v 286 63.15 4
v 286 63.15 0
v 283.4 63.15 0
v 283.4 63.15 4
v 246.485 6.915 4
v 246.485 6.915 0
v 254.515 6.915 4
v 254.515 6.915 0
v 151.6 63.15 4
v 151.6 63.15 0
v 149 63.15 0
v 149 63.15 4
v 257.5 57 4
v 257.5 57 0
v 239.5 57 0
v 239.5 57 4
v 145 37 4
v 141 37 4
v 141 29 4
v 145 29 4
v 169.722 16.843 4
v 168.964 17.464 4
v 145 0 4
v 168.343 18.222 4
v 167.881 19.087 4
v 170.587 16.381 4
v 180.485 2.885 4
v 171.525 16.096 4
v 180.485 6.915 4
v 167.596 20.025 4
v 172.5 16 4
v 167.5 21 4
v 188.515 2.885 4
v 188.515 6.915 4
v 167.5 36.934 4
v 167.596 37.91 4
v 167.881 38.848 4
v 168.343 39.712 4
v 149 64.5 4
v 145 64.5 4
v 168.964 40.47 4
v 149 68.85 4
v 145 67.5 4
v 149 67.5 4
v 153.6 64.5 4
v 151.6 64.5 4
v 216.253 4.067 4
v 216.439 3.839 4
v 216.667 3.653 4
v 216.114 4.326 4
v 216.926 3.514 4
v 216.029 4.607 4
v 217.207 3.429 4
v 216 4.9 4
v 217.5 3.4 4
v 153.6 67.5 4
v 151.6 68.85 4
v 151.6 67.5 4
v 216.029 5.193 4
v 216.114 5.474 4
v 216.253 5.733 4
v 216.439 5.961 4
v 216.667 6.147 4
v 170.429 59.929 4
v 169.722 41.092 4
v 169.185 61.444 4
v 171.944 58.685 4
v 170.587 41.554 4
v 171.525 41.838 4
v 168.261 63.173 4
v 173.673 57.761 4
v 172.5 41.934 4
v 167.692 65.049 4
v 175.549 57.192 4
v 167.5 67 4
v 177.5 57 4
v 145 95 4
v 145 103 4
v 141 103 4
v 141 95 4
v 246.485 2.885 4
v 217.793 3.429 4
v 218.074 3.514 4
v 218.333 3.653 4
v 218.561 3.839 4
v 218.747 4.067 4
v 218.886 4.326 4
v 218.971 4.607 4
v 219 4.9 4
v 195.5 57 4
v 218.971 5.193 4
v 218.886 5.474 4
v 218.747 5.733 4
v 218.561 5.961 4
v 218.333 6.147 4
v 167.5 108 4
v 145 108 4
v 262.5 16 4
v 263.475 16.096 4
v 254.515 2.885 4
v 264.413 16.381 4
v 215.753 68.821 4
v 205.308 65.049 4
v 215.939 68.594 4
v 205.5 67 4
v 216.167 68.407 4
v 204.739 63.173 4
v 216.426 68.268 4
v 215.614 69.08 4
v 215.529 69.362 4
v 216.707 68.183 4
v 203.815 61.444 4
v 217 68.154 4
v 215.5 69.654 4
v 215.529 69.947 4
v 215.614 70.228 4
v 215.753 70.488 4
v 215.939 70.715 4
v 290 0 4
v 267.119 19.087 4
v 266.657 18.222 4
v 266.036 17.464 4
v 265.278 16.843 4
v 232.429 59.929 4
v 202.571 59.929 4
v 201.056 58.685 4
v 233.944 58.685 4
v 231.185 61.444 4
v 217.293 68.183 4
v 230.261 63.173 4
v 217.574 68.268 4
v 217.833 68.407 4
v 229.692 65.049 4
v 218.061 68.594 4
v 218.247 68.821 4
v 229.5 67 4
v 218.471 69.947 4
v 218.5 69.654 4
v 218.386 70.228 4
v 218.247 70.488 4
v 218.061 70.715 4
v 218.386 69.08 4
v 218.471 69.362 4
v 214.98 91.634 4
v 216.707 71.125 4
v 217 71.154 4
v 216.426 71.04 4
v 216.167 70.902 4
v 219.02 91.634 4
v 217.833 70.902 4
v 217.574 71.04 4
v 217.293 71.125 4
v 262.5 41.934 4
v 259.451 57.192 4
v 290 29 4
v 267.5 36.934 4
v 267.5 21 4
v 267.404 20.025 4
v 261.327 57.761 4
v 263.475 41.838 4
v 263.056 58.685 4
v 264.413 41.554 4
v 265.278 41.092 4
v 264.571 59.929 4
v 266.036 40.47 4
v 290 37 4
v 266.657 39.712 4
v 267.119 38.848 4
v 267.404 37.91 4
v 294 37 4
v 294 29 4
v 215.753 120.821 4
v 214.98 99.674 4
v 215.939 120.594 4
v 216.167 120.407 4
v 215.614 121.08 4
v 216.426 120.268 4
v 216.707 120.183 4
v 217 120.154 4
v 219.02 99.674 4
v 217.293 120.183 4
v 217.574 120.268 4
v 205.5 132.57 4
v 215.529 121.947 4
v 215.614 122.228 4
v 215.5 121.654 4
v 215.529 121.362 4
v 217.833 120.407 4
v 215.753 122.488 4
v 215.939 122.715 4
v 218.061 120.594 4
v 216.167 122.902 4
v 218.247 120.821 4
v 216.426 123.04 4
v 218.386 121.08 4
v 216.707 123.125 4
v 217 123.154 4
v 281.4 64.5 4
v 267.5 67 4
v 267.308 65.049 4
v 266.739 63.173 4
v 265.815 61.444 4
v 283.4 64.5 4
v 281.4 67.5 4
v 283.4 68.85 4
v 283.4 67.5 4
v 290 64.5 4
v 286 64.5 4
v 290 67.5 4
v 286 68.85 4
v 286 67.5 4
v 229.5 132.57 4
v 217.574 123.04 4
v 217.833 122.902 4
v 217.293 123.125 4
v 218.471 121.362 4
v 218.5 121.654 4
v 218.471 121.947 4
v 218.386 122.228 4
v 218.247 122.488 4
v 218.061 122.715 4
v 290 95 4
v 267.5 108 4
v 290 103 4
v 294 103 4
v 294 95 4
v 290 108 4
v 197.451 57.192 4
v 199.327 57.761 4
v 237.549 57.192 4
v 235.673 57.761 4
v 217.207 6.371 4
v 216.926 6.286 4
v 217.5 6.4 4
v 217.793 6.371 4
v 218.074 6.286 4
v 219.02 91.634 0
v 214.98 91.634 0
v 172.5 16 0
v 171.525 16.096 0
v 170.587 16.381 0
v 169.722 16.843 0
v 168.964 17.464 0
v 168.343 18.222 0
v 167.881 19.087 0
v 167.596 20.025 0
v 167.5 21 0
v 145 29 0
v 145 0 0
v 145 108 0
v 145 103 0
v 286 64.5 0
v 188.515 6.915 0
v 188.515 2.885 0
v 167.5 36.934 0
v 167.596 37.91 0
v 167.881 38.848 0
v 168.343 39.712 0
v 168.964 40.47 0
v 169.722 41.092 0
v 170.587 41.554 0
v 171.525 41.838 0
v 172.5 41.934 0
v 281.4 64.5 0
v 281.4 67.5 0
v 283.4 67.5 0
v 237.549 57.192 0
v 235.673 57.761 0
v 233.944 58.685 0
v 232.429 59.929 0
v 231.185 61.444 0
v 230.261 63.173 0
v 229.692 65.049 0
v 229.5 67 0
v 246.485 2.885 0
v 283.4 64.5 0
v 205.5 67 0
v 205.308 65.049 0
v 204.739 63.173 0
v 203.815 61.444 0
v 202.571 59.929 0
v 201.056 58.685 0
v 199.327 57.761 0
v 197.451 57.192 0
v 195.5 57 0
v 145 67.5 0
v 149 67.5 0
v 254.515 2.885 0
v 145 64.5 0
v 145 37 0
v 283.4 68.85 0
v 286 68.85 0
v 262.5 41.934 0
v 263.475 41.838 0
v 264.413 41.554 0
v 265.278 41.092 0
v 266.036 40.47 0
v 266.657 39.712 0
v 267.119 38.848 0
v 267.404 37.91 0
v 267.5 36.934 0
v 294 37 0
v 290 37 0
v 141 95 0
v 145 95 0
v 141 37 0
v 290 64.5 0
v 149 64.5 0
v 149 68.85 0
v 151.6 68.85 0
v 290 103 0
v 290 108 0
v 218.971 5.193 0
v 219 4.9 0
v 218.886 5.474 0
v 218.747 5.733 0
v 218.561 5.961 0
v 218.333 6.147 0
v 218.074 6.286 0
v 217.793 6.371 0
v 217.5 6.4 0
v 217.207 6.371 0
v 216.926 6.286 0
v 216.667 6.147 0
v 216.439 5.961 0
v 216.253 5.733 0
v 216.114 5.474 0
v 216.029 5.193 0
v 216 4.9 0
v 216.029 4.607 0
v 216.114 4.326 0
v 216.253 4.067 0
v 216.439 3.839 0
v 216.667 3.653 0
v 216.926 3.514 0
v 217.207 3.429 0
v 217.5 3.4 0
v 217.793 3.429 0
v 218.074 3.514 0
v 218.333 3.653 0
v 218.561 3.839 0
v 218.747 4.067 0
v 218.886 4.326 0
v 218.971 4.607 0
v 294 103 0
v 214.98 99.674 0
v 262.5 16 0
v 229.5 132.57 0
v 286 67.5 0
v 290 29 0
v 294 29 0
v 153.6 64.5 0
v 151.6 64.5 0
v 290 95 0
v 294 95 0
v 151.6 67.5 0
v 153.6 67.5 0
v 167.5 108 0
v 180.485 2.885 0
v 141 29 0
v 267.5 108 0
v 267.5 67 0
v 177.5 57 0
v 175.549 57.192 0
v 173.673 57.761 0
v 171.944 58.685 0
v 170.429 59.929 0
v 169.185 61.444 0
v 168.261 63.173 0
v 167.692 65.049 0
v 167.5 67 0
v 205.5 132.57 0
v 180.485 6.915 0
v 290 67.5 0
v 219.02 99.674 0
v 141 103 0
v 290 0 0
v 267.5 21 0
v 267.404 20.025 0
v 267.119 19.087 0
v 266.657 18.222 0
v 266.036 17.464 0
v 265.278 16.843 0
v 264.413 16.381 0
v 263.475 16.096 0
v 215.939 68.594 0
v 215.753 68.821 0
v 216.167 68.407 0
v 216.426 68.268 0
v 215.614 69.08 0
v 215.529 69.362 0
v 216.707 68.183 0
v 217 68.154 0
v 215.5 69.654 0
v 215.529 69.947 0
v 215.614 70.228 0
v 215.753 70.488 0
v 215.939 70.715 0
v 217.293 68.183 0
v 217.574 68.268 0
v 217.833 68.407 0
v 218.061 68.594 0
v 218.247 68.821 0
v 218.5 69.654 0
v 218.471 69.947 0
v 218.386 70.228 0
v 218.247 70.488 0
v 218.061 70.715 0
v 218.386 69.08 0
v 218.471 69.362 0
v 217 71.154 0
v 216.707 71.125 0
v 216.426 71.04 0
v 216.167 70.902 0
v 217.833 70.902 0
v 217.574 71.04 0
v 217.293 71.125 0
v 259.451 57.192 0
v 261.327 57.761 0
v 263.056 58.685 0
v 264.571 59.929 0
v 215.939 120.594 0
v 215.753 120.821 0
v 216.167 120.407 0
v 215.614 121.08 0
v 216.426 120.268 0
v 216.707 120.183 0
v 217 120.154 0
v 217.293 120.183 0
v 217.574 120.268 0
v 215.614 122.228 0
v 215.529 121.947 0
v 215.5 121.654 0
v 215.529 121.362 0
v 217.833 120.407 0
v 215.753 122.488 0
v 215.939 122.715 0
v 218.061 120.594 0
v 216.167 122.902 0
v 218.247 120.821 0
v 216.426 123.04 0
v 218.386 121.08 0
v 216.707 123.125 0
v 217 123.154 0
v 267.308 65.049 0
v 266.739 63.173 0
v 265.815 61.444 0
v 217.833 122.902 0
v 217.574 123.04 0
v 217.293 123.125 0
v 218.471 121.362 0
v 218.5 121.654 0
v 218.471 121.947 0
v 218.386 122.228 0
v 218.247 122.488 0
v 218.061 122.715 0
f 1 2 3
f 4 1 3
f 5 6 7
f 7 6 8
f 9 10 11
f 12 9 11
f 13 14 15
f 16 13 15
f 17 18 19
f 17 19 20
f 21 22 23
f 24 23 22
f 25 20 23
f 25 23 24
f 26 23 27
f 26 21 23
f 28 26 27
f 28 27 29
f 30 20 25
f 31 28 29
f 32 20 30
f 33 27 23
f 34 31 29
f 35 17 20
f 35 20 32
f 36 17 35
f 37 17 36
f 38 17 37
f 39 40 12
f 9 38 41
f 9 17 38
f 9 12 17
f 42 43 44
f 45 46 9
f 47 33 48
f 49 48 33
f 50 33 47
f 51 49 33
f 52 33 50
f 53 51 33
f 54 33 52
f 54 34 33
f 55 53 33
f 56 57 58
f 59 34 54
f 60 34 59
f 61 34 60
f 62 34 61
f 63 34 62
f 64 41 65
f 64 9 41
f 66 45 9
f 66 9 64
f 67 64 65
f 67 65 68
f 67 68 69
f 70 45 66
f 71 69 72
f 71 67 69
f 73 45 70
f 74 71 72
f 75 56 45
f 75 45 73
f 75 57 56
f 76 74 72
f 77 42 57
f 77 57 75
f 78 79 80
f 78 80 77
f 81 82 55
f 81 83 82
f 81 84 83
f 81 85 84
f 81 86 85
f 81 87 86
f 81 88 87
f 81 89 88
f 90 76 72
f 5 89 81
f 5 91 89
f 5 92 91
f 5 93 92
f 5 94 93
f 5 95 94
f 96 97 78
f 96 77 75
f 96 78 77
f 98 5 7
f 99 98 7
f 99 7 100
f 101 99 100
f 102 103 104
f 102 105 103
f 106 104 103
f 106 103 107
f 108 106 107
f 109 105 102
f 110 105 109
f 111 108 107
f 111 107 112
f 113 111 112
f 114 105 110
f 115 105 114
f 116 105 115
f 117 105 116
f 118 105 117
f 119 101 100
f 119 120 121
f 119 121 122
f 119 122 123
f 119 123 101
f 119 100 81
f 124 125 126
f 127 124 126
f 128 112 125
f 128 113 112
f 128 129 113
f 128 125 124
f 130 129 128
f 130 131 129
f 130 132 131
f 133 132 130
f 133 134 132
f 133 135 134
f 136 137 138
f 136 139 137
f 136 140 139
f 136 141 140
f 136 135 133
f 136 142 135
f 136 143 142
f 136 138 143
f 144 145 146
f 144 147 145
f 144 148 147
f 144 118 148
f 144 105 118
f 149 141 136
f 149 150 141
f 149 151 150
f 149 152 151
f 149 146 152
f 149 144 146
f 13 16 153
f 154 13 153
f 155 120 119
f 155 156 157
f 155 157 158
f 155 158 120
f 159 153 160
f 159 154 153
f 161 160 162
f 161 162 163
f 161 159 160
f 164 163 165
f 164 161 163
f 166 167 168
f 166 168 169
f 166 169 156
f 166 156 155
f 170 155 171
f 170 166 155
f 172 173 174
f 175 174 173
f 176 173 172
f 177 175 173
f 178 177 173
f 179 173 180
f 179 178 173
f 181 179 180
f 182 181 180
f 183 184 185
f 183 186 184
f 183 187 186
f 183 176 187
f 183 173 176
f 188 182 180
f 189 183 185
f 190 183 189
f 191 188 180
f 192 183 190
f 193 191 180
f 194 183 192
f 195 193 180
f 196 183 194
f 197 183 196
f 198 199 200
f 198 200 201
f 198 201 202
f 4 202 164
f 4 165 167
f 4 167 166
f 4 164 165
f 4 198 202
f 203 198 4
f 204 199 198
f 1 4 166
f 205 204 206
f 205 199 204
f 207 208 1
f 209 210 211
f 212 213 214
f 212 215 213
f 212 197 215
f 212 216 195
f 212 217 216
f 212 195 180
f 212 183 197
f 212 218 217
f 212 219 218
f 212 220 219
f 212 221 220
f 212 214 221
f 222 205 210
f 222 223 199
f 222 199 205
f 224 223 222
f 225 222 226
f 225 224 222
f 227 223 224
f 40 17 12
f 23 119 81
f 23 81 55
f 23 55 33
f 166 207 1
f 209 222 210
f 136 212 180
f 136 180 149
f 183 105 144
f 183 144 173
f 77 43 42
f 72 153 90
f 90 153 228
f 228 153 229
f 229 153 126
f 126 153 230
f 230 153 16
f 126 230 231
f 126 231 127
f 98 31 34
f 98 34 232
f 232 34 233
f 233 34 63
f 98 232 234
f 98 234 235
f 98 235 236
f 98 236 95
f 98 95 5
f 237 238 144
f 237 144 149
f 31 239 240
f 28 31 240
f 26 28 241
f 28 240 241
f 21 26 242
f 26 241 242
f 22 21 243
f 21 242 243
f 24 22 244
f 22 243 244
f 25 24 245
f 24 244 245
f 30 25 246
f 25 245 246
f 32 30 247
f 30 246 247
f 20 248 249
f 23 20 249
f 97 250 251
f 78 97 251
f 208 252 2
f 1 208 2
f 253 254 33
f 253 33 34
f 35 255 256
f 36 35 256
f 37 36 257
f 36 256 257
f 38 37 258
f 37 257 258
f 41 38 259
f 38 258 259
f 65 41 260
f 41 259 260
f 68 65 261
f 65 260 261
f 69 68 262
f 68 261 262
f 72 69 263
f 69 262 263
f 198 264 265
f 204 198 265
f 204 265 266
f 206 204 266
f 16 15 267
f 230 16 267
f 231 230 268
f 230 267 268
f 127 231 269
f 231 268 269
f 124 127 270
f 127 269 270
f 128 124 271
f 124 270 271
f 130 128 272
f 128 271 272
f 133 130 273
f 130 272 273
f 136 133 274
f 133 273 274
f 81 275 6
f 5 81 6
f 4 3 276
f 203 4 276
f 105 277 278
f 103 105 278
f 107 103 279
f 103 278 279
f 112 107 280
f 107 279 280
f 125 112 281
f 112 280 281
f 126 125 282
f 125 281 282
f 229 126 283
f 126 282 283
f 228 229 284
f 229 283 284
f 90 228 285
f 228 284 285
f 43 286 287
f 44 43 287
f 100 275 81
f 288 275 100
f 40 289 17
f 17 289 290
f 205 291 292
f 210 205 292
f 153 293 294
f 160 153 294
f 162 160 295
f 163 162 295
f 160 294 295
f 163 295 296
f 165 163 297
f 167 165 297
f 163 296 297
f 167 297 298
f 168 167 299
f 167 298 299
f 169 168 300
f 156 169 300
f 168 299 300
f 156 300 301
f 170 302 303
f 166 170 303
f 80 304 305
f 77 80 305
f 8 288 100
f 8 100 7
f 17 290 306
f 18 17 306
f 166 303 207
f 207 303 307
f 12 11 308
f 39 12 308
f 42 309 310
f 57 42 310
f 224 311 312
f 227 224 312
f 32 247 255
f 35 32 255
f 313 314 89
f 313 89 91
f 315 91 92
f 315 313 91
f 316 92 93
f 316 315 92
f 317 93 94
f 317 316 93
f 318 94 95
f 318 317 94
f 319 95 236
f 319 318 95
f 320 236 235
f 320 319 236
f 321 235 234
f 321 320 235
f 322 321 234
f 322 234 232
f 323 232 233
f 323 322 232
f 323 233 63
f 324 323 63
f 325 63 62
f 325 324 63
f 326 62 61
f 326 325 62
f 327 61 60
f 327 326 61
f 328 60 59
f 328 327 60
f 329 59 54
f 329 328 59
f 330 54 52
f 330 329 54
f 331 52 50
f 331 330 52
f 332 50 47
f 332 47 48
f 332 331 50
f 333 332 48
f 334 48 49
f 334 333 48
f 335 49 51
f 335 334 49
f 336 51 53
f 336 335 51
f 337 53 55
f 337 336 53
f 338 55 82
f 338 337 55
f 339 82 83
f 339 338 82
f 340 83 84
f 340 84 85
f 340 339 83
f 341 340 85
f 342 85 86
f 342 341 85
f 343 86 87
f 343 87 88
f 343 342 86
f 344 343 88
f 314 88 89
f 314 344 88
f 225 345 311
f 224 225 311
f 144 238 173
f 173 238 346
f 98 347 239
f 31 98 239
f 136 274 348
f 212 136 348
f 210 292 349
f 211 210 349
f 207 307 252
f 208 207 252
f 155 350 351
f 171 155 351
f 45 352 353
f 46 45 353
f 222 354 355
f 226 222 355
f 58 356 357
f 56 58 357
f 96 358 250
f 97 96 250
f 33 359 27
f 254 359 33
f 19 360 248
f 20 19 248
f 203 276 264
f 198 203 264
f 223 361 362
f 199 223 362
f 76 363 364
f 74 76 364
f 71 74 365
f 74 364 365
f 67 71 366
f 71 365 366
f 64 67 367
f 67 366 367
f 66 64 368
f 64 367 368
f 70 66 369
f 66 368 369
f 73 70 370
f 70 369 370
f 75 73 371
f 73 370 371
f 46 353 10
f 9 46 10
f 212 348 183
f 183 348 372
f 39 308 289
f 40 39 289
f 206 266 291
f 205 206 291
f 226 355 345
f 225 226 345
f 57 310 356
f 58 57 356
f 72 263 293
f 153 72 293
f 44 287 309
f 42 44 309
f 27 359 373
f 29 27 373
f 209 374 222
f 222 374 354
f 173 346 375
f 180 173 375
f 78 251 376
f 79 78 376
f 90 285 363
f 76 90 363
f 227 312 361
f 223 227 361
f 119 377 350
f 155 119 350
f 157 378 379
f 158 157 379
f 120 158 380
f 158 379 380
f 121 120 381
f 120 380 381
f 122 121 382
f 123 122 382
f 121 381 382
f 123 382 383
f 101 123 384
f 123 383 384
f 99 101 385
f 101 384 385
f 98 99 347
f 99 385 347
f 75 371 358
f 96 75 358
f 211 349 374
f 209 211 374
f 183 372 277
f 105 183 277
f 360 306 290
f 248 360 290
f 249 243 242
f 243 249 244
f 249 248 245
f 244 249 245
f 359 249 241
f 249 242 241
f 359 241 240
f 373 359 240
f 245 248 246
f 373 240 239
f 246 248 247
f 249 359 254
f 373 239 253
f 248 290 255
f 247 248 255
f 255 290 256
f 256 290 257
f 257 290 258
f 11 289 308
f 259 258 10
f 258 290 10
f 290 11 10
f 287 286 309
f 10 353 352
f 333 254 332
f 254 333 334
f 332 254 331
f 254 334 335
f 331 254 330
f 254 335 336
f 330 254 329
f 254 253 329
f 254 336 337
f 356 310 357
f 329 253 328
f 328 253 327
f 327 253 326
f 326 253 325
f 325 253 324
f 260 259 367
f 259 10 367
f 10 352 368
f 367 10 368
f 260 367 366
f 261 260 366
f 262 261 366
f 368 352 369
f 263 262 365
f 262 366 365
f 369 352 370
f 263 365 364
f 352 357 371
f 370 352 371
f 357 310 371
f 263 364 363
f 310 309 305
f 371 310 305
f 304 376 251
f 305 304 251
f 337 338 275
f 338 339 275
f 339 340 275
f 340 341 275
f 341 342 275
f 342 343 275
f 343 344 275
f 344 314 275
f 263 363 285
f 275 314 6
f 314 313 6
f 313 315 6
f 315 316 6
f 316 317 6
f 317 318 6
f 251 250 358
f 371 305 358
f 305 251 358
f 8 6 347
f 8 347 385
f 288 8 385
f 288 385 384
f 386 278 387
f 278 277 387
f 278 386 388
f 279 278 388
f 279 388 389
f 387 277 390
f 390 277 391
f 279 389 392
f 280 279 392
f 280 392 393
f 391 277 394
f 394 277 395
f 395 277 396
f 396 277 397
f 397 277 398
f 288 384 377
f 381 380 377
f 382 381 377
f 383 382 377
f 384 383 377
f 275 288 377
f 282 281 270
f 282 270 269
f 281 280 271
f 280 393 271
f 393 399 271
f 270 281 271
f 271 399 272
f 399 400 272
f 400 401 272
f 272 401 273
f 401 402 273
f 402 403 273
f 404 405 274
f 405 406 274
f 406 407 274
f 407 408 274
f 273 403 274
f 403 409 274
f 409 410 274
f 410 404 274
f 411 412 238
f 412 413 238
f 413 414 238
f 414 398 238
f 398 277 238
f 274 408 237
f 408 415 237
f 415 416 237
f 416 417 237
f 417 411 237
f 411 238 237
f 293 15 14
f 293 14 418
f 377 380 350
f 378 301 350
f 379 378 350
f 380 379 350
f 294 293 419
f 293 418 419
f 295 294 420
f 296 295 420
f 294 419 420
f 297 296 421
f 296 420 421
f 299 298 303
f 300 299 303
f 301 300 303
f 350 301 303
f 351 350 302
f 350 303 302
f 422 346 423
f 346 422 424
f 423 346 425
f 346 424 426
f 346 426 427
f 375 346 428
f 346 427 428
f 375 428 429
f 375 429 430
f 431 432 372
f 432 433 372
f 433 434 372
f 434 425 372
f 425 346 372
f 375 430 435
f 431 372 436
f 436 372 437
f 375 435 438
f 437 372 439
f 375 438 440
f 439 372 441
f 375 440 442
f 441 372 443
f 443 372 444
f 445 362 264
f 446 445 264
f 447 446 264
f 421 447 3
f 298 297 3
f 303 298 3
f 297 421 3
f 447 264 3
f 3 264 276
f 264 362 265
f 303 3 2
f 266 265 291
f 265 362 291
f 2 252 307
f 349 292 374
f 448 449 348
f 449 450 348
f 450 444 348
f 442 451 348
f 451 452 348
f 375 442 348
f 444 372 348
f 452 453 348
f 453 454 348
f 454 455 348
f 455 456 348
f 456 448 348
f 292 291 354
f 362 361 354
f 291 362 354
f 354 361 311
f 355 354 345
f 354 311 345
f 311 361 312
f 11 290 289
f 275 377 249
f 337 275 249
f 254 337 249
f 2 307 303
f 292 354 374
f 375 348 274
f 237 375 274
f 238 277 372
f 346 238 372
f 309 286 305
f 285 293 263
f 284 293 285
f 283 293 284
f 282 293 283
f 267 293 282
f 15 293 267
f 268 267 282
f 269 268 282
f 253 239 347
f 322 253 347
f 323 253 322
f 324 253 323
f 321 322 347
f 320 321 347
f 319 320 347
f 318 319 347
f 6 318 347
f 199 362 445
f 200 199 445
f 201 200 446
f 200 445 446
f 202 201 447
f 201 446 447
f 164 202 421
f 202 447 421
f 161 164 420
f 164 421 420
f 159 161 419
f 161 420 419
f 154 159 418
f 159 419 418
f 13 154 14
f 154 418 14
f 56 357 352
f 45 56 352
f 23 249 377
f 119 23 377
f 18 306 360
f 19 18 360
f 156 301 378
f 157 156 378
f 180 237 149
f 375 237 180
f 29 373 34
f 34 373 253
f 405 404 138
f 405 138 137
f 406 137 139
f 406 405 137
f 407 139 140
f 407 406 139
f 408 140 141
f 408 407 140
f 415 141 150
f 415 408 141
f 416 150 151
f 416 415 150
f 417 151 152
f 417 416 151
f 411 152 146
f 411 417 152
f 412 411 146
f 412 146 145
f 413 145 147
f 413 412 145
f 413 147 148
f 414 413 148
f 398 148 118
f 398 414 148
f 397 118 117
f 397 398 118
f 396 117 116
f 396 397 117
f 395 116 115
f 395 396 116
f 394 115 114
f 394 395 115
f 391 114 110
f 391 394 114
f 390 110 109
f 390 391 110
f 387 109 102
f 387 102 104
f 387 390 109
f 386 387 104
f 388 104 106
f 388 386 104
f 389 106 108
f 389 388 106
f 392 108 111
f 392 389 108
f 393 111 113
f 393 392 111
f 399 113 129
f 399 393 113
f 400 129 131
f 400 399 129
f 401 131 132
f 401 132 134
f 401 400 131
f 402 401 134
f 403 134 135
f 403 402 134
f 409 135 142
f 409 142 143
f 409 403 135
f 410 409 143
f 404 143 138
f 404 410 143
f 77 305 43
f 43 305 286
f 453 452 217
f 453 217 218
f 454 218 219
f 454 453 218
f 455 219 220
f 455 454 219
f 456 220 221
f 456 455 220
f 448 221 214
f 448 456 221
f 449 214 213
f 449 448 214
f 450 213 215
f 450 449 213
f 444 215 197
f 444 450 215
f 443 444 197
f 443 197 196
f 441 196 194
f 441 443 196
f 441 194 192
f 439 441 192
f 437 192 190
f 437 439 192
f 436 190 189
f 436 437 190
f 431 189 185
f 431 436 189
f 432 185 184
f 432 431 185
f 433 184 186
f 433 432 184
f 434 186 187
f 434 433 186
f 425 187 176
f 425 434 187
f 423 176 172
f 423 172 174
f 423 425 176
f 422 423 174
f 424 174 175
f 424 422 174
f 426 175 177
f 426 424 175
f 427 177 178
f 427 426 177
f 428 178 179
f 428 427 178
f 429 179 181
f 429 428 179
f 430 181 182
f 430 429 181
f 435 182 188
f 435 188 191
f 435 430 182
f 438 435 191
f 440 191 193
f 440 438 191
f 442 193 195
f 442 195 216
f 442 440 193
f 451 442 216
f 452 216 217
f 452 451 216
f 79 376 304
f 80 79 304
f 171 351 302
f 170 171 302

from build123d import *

# Parameters (mm, degrees)
SKETCH_1_W      = 8.03
SKETCH_1_H      = 4.03
SKETCH_1_R      = 1.5
SKETCH_1_W_2    = 4.04
SKETCH_1_H_2    = 8.04
EXTRUDE_1_DEPTH = 4


with BuildPart() as part:
    # 草图1 → 凸台-拉伸1 (new body)
    with BuildSketch(Plane.XY):
        with BuildLine():
            Line((149, 64.5), (145, 64.5))
            Line((145, 64.5), (145, 37))
            Line((145, 37), (141, 37))
            Line((141, 37), (141, 29))
            Line((141, 29), (145, 29))
            Line((145, 29), (145, 0))
            Line((145, 0), (290, 0))
            Line((290, 0), (290, 29))
            Line((290, 29), (294, 29))
            Line((294, 29), (294, 37))
            Line((294, 37), (290, 37))
            Line((290, 37), (290, 64.5))
            Line((290, 64.5), (286, 64.5))
            Line((286, 64.5), (286, 63.15))
            Line((286, 63.15), (283.4, 63.15))
            Line((283.4, 63.15), (283.4, 64.5))
            Line((283.4, 64.5), (281.4, 64.5))
            Line((281.4, 64.5), (281.4, 67.5))
            Line((281.4, 67.5), (283.4, 67.5))
            Line((283.4, 67.5), (283.4, 68.85))
            Line((283.4, 68.85), (286, 68.85))
            Line((286, 68.85), (286, 67.5))
            Line((286, 67.5), (290, 67.5))
            Line((290, 67.5), (290, 95))
            Line((290, 95), (294, 95))
            Line((294, 95), (294, 103))
            Line((294, 103), (290, 103))
            Line((290, 103), (290, 108))
            Line((290, 108), (267.5, 108))
            Line((267.5, 108), (267.5, 67))
            ThreePointArc((267.5, 67), (264.571067812, 59.928932188), (257.5, 57))
            Line((257.5, 57), (239.5, 57))
            ThreePointArc((239.5, 57), (232.428932188, 59.928932188), (229.5, 67))
            Line((229.5, 67), (229.5, 132.57))
            Line((229.5, 132.57), (205.5, 132.57))
            Line((205.5, 132.57), (205.5, 67))
            ThreePointArc((205.5, 67), (202.571067812, 59.928932188), (195.5, 57))
            Line((195.5, 57), (177.5, 57))
            ThreePointArc((177.5, 57), (170.428932188, 59.928932188), (167.5, 67))
            Line((167.5, 67), (167.5, 108))
            Line((167.5, 108), (145, 108))
            Line((145, 108), (145, 103))
            Line((145, 103), (141, 103))
            Line((141, 103), (141, 95))
            Line((141, 95), (145, 95))
            Line((145, 95), (145, 67.5))
            Line((145, 67.5), (149, 67.5))
            Line((149, 67.5), (149, 68.85))
            Line((149, 68.85), (151.6, 68.85))
            Line((151.6, 68.85), (151.6, 67.5))
            Line((151.6, 67.5), (153.6, 67.5))
            Line((153.6, 67.5), (153.6, 64.5))
            Line((153.6, 64.5), (151.6, 64.5))
            Line((151.6, 64.5), (151.6, 63.15))
            Line((151.6, 63.15), (149, 63.15))
            Line((149, 63.15), (149, 64.5))
        make_face()
        with Locations((184.5, 4.9)):
            Rectangle(SKETCH_1_W, SKETCH_1_H, mode=Mode.SUBTRACT)
        with BuildLine():
            ThreePointArc((167.5, 36.934316811), (168.964466094, 40.469850717), (172.5, 41.934316811))
            Line((172.5, 41.934316811), (262.5, 41.934316811))
            ThreePointArc((262.5, 41.934316811), (266.035533906, 40.469850717), (267.5, 36.934316811))
            Line((267.5, 36.934316811), (267.5, 21))
            ThreePointArc((267.5, 21), (266.035533906, 17.464466094), (262.5, 16))
            Line((262.5, 16), (172.5, 16))
            ThreePointArc((172.5, 16), (168.964466094, 17.464466094), (167.5, 21))
            Line((167.5, 21), (167.5, 36.934316811))
        make_face(mode=Mode.SUBTRACT)
        with Locations((217.5, 4.9)):
            Circle(SKETCH_1_R, mode=Mode.SUBTRACT)
        with Locations((250.5, 4.9)):
            Rectangle(SKETCH_1_W, SKETCH_1_H, mode=Mode.SUBTRACT)
        with Locations((217, 69.654316811)):
            Circle(SKETCH_1_R, mode=Mode.SUBTRACT)
        with Locations((217, 95.654316811)):
            Rectangle(SKETCH_1_W_2, SKETCH_1_H_2, mode=Mode.SUBTRACT)
        with Locations((217, 121.654316811)):
            Circle(SKETCH_1_R, mode=Mode.SUBTRACT)
    extrude(amount=EXTRUDE_1_DEPTH)


solid = part.part
